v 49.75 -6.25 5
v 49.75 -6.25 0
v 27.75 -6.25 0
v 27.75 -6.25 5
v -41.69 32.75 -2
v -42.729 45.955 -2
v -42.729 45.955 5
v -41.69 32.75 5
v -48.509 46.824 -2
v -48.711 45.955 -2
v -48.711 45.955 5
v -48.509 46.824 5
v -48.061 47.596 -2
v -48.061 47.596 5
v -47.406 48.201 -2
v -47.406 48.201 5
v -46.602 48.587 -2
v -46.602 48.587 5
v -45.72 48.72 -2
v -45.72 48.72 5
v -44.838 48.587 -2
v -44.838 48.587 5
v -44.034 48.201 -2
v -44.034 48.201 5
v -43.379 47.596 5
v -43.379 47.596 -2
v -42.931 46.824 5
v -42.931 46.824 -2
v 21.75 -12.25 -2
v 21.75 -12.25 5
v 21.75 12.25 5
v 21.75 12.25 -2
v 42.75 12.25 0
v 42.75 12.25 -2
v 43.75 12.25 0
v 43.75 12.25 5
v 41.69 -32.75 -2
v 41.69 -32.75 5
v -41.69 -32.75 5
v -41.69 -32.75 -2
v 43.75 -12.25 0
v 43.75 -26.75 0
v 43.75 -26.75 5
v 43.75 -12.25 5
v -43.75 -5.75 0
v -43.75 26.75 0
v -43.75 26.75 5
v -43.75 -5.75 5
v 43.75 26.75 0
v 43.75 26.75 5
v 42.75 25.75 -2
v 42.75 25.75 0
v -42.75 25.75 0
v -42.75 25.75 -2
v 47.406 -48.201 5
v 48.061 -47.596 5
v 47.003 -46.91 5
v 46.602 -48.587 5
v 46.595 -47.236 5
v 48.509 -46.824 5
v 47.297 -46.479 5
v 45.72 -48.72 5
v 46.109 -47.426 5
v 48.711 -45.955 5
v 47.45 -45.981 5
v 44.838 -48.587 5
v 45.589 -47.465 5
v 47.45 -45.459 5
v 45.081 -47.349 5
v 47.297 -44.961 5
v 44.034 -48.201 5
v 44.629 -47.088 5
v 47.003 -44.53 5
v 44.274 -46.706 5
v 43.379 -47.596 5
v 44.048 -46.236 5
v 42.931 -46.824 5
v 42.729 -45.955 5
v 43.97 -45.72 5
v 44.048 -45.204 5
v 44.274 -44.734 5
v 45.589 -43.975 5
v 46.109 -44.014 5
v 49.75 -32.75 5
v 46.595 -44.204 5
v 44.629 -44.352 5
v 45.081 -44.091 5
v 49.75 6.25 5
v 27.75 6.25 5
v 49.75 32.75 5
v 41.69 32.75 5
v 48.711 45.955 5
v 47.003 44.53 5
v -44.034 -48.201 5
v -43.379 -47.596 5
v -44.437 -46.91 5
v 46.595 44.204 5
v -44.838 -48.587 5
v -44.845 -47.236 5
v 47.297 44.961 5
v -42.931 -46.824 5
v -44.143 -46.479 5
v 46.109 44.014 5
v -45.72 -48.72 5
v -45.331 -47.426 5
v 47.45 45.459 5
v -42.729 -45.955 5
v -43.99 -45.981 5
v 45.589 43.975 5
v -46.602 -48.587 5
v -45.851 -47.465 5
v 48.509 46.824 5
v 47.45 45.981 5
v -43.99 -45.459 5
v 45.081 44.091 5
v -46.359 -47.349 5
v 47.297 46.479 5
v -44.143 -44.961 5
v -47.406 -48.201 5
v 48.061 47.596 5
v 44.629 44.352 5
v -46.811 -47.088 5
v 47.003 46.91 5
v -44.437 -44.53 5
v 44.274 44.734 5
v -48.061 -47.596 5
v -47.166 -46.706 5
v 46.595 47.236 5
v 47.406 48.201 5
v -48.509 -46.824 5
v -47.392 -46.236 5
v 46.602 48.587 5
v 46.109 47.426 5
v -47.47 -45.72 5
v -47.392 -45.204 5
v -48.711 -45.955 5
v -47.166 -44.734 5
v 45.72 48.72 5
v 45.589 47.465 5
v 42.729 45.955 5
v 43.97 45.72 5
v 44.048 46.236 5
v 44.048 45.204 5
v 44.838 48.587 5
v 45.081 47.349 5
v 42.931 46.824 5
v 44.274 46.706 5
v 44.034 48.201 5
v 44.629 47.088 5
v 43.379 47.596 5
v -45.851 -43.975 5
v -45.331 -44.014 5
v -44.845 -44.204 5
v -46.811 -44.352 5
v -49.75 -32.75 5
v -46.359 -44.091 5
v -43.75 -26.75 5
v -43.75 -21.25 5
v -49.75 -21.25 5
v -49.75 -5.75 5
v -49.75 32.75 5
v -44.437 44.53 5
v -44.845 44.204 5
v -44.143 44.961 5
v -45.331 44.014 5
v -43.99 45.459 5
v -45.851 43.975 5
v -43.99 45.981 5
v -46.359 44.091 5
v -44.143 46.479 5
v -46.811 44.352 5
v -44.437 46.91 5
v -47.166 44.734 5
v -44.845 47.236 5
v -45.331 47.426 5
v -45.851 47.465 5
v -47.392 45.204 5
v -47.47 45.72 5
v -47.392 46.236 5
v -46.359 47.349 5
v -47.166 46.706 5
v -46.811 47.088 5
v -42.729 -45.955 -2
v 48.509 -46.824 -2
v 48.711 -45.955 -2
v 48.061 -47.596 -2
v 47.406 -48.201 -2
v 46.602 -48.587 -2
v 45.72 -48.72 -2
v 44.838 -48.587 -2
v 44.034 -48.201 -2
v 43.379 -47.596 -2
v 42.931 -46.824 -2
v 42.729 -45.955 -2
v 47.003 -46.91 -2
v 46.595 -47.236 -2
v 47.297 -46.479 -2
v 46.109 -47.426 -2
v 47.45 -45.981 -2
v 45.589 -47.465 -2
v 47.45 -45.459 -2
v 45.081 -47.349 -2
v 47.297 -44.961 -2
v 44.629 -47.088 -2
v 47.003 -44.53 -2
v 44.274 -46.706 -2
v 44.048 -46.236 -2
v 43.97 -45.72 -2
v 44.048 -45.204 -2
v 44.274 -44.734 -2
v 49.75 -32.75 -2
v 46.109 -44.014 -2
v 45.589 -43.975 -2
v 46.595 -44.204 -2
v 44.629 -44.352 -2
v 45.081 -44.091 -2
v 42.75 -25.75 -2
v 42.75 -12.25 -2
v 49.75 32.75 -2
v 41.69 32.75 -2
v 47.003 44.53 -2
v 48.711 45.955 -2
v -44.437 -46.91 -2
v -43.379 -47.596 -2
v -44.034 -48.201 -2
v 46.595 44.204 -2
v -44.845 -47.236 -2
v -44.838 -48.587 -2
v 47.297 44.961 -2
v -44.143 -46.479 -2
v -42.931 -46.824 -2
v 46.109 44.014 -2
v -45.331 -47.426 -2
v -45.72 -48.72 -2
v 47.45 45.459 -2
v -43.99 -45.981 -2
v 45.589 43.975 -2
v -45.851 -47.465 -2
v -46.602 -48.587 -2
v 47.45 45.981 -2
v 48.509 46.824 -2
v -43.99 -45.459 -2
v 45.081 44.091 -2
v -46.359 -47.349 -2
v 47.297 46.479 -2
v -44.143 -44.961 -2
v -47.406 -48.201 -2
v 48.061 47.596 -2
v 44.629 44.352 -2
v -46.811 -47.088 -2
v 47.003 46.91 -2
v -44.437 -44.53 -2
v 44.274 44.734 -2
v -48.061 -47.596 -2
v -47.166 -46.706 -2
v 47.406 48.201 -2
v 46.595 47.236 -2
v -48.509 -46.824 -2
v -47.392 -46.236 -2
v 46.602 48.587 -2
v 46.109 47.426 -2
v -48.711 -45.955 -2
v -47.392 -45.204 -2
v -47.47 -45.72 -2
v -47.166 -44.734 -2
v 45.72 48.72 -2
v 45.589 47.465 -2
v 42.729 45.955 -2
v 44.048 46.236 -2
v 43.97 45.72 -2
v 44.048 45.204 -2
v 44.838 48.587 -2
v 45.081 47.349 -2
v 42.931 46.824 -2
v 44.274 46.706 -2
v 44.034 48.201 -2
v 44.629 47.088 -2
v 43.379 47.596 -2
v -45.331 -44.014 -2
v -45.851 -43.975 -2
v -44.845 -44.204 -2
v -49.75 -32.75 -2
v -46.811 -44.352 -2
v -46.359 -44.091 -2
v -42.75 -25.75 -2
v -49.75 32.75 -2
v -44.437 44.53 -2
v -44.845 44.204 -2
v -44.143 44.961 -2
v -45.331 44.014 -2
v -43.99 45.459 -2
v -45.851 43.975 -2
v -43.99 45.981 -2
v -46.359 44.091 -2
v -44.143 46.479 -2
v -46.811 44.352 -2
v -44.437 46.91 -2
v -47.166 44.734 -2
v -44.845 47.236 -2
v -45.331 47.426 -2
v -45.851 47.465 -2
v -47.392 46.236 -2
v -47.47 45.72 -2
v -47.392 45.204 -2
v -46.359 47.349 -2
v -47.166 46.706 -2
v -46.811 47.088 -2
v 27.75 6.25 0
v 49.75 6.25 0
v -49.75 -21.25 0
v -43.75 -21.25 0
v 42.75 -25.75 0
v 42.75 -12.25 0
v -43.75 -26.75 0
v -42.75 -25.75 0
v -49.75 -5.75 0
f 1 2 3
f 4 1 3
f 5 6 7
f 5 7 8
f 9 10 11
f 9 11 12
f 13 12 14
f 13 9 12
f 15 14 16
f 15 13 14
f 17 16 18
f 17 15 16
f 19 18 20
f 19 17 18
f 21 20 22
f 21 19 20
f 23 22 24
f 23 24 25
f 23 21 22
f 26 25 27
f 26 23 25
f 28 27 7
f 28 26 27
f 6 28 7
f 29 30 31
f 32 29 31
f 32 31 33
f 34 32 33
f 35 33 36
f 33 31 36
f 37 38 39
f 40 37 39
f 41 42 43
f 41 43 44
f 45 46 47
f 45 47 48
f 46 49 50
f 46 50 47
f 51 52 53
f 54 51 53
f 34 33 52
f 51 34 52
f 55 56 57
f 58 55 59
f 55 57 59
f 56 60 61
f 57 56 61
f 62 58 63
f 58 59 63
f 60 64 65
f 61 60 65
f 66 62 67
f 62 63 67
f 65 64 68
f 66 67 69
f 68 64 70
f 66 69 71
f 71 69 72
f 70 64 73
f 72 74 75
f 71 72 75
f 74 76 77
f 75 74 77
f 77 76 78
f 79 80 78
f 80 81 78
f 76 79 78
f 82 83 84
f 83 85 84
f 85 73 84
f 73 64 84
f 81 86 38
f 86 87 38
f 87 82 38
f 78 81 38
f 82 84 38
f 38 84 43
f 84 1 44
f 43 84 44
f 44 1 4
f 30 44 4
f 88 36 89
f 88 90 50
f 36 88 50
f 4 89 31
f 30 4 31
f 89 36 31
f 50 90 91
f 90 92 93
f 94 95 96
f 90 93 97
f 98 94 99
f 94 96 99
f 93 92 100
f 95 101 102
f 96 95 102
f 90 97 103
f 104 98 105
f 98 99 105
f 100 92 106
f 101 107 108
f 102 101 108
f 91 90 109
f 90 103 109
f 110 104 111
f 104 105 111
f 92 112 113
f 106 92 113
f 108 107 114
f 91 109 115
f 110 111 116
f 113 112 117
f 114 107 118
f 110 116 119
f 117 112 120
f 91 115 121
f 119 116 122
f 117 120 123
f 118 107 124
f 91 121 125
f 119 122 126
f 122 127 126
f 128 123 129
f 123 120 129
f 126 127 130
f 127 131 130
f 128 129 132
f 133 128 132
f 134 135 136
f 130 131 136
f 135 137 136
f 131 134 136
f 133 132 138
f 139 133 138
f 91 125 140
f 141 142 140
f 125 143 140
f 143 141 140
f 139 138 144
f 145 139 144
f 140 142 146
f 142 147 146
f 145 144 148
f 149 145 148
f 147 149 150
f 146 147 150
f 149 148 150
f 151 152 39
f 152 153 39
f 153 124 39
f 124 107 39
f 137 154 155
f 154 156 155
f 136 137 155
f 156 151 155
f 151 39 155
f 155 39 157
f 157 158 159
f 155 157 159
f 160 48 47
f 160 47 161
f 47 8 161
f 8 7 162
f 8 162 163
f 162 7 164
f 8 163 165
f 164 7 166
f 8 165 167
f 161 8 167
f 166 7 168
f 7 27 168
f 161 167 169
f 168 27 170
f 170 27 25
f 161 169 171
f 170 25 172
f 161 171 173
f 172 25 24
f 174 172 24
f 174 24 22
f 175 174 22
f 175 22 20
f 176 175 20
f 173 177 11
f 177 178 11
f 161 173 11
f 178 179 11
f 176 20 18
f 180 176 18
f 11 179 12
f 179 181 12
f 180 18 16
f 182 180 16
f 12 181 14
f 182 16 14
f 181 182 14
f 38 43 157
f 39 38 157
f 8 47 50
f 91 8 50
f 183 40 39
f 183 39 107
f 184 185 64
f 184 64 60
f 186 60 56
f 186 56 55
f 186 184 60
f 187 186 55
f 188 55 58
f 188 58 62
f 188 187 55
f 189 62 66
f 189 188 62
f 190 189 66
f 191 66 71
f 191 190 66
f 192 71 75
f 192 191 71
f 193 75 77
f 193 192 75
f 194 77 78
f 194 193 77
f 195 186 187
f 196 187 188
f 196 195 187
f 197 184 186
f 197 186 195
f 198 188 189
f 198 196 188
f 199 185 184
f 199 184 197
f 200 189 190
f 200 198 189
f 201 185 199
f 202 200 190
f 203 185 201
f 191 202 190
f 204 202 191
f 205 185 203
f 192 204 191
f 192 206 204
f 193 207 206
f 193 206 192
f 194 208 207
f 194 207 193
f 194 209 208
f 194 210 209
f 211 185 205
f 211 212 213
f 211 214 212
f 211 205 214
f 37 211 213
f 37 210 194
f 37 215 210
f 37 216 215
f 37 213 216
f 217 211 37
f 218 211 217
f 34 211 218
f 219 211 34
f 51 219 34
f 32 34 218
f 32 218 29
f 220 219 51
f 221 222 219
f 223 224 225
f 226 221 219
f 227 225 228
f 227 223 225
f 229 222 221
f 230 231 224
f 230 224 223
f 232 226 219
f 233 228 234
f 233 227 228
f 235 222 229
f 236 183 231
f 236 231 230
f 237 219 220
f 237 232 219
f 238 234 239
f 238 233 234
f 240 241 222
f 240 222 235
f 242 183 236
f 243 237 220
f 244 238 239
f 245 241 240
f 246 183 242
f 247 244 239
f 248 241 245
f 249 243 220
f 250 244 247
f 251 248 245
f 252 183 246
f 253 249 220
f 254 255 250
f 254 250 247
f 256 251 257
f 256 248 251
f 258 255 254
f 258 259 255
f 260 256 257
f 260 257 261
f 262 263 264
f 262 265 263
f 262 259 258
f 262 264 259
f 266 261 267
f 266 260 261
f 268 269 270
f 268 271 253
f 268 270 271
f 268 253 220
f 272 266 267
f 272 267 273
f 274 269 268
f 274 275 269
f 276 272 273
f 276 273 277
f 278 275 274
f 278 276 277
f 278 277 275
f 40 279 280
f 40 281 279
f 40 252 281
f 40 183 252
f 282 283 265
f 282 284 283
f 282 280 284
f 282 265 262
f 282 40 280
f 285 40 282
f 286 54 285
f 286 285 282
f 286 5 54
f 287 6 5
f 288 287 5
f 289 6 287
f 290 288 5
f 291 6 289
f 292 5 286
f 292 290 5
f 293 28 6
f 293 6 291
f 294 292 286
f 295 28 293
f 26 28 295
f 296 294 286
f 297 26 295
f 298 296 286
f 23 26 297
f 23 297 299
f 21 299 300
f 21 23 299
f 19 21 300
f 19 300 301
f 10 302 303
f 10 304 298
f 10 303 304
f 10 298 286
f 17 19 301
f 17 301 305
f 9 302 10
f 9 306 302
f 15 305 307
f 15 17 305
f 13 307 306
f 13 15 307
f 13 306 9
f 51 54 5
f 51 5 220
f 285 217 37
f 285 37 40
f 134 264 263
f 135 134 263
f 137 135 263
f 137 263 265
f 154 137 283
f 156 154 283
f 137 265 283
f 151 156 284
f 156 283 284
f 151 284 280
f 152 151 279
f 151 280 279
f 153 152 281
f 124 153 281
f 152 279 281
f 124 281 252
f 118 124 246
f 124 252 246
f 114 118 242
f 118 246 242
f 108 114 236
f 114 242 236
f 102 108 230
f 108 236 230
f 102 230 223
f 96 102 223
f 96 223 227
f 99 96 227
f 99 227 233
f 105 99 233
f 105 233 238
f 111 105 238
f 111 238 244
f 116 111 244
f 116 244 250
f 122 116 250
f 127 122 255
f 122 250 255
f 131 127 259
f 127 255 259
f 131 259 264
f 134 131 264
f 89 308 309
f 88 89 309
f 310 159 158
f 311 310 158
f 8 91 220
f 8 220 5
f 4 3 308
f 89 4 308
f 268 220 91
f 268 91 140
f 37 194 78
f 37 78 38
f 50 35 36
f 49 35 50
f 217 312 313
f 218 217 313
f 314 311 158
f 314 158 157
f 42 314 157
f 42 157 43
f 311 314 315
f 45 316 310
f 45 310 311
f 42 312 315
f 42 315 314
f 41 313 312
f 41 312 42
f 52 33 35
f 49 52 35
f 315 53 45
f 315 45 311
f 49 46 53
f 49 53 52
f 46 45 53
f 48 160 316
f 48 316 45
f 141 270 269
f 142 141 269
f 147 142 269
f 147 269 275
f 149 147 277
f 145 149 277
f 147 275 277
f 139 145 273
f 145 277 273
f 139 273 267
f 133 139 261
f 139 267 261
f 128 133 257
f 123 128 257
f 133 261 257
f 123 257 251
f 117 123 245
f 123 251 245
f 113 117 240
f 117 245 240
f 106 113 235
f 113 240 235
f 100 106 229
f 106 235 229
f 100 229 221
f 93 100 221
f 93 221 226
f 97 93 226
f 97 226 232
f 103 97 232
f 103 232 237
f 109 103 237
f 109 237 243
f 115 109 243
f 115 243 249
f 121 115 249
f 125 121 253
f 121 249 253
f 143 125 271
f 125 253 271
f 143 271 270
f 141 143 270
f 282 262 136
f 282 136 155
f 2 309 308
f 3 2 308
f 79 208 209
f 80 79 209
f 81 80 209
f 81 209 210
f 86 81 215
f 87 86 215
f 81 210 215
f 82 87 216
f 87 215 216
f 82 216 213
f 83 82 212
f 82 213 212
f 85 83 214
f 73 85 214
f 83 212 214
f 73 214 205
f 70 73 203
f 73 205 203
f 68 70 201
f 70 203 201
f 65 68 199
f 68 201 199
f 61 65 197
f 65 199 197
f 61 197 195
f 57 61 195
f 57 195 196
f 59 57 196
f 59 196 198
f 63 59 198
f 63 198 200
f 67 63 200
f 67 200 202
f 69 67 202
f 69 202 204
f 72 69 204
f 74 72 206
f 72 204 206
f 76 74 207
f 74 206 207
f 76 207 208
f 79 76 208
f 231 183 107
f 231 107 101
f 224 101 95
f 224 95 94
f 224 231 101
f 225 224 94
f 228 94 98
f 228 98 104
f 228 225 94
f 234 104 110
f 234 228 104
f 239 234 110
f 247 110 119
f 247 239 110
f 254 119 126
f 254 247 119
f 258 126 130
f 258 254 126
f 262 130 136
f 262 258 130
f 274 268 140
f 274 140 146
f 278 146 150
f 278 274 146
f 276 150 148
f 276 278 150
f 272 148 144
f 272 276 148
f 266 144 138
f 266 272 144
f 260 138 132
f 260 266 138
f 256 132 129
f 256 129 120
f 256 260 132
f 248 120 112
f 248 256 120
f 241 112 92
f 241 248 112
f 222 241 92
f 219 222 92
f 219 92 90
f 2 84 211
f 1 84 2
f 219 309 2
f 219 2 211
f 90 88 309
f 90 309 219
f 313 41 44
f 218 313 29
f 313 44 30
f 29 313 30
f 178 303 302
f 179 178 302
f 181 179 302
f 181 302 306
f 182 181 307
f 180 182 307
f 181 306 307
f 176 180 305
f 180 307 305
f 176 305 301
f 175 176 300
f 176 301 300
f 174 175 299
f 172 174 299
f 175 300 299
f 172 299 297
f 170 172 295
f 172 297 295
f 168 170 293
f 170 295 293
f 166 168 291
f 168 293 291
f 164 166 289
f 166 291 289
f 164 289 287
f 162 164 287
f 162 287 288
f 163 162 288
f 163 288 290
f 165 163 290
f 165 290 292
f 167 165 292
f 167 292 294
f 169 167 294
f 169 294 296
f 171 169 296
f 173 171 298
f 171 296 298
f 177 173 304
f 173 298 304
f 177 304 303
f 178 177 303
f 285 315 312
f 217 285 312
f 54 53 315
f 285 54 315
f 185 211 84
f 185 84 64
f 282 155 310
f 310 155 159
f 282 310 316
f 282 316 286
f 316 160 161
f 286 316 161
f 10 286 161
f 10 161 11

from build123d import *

# Parameters (mm, degrees)
BOSS_EXTRUDE1_DEPTH   = 5
SHELL1_T              = 6
SKETCH4_W             = 99.5
SKETCH4_H             = 65.5
BOSS_EXTRUDE2_DEPTH   = 2
SKETCH5_W             = 6
SKETCH5_H             = 15.5
CUT_EXTRUDE2_DEPTH    = 5
SKETCH7_R             = 3
SKETCH7_R_2           = 1.75
BOSS_EXTRUDE3_DEPTH   = 7
BOSS_EXTRUDE3_2_DEPTH = 7
BOSS_EXTRUDE3_3_DEPTH = 7
BOSS_EXTRUDE3_4_DEPTH = 7
BOSS_EXTRUDE4_DEPTH   = 7


with BuildPart() as part:
    # Sketch1 → Boss-Extrude1 (new body)
    with BuildSketch(Plane.XY):
        Polygon((43.75, 26.75), (-43.75, 26.75), (-43.75, -26.75), (43.75, -26.75), (43.75, -12.25), (21.75, -12.25), (21.75, 12.25), (43.75, 12.25), align=None)
    extrude(amount=BOSS_EXTRUDE1_DEPTH)

    # Shell1
    shell1_openings = [part.faces().sort_by_distance(p)[0] for p in [
        (-4.261512463, 0, 0),
        (-4.261512463, 0, 5),
    ]]
    offset(amount=SHELL1_T, openings=shell1_openings, kind=Kind.INTERSECTION)

    # Sketch4 → Boss-Extrude2 (add)
    with BuildSketch(Plane(origin=(0, 0, 0), x_dir=(-1, 0, 0), z_dir=(0, 0, -1))):
        Rectangle(SKETCH4_W, SKETCH4_H)
        Polygon((-42.75, 12.25), (-42.75, 25.75), (42.75, 25.75), (42.75, -25.75), (-42.75, -25.75), (-42.75, -12.25), (-21.75, -12.25), (-21.75, 12.25), align=None, mode=Mode.SUBTRACT)
    extrude(amount=BOSS_EXTRUDE2_DEPTH)

    # Sketch5 → Cut-Extrude2 (cut)
    with BuildSketch(Plane.XY.offset(5)):
        with Locations((-46.75, -13.5)):
            Rectangle(SKETCH5_W, SKETCH5_H)
    extrude(amount=-CUT_EXTRUDE2_DEPTH, mode=Mode.SUBTRACT)



with BuildPart() as body_2:
    # Sketch7 → Boss-Extrude3 (new body)
    with BuildSketch(Plane(origin=(0, 0, -2), x_dir=(-1, 0, 0), z_dir=(0, 0, -1))):
        with Locations((-45.72, 45.72)):
            Circle(SKETCH7_R)
        with Locations((-45.72, 45.72)):
            Circle(SKETCH7_R_2, mode=Mode.SUBTRACT)
    extrude(amount=-BOSS_EXTRUDE3_DEPTH)


with BuildPart() as body_3:
    # Sketch7 → Boss-Extrude3 2 (new body)
    with BuildSketch(Plane(origin=(0, 0, -2), x_dir=(-1, 0, 0), z_dir=(0, 0, -1))):
        with Locations((45.72, 45.72)):
            Circle(SKETCH7_R)
        with Locations((45.72, 45.72)):
            Circle(SKETCH7_R_2, mode=Mode.SUBTRACT)
    extrude(amount=-BOSS_EXTRUDE3_2_DEPTH)


with BuildPart() as body_4:
    # Sketch7 → Boss-Extrude3 3 (new body)
    with BuildSketch(Plane(origin=(0, 0, -2), x_dir=(-1, 0, 0), z_dir=(0, 0, -1))):
        with Locations((45.72, -45.72)):
            Circle(SKETCH7_R)
        with Locations((45.72, -45.72)):
            Circle(SKETCH7_R_2, mode=Mode.SUBTRACT)
    extrude(amount=-BOSS_EXTRUDE3_3_DEPTH)


with BuildPart() as body_5:
    # Sketch7 → Boss-Extrude3 4 (new body)
    with BuildSketch(Plane(origin=(0, 0, -2), x_dir=(-1, 0, 0), z_dir=(0, 0, -1))):
        with Locations((-45.72, -45.72)):
            Circle(SKETCH7_R)
        with Locations((-45.72, -45.72)):
            Circle(SKETCH7_R_2, mode=Mode.SUBTRACT)
    extrude(amount=-BOSS_EXTRUDE3_4_DEPTH)


with BuildPart() as part_1:
    add(part.part)

    add(body_2.part)  # Boss-Extrude4 merges body 2

    add(body_3.part)  # Boss-Extrude4 merges body 3

    add(body_4.part)  # Boss-Extrude4 merges body 4

    add(body_5.part)  # Boss-Extrude4 merges body 5
    # Sketch8 → Boss-Extrude4 (add)
    with BuildSketch(Plane(origin=(0, 0, -2), x_dir=(-1, 0, 0), z_dir=(0, 0, -1))):
        with BuildLine():
            Line((-48.71075267, 45.955368794), (-49.75, 32.75))
            Line((-49.75, 32.75), (-41.69, 32.75))
            Line((-41.69, 32.75), (-42.72924733, 45.955368794))
            ThreePointArc((-42.72924733, 45.955368794), (-42.722312724, 45.837775191), (-42.72, 45.72))
            ThreePointArc((-42.72, 45.72), (-45.837775191, 42.722312724), (-48.71075267, 45.955368794))
        make_face()
        with BuildLine():
            Line((42.72924733, 45.955368794), (41.69, 32.75))
            Line((41.69, 32.75), (49.75, 32.75))
            Line((49.75, 32.75), (48.71075267, 45.955368794))
            ThreePointArc((48.71075267, 45.955368794), (48.717687276, 45.837775191), (48.72, 45.72))
            ThreePointArc((48.72, 45.72), (45.602224809, 42.722312724), (42.72924733, 45.955368794))
        make_face()
        with BuildLine():
            Line((49.75, -32.75), (41.69, -32.75))
            Line((41.69, -32.75), (42.72924733, -45.955368794))
            ThreePointArc((42.72924733, -45.955368794), (45.602224809, -42.722312724), (48.72, -45.72))
            ThreePointArc((48.72, -45.72), (48.717687276, -45.837775191), (48.71075267, -45.955368794))
            Line((48.71075267, -45.955368794), (49.75, -32.75))
        make_face()
        with BuildLine():
            Line((-42.72924733, -45.955368794), (-41.69, -32.75))
            Line((-41.69, -32.75), (-49.75, -32.75))
            Line((-49.75, -32.75), (-48.71075267, -45.955368794))
            ThreePointArc((-48.71075267, -45.955368794), (-45.837775191, -42.722312724), (-42.72, -45.72))
            ThreePointArc((-42.72, -45.72), (-42.722312724, -45.837775191), (-42.72924733, -45.955368794))
        make_face()
    extrude(amount=-BOSS_EXTRUDE4_DEPTH)


solid = part_1.part
